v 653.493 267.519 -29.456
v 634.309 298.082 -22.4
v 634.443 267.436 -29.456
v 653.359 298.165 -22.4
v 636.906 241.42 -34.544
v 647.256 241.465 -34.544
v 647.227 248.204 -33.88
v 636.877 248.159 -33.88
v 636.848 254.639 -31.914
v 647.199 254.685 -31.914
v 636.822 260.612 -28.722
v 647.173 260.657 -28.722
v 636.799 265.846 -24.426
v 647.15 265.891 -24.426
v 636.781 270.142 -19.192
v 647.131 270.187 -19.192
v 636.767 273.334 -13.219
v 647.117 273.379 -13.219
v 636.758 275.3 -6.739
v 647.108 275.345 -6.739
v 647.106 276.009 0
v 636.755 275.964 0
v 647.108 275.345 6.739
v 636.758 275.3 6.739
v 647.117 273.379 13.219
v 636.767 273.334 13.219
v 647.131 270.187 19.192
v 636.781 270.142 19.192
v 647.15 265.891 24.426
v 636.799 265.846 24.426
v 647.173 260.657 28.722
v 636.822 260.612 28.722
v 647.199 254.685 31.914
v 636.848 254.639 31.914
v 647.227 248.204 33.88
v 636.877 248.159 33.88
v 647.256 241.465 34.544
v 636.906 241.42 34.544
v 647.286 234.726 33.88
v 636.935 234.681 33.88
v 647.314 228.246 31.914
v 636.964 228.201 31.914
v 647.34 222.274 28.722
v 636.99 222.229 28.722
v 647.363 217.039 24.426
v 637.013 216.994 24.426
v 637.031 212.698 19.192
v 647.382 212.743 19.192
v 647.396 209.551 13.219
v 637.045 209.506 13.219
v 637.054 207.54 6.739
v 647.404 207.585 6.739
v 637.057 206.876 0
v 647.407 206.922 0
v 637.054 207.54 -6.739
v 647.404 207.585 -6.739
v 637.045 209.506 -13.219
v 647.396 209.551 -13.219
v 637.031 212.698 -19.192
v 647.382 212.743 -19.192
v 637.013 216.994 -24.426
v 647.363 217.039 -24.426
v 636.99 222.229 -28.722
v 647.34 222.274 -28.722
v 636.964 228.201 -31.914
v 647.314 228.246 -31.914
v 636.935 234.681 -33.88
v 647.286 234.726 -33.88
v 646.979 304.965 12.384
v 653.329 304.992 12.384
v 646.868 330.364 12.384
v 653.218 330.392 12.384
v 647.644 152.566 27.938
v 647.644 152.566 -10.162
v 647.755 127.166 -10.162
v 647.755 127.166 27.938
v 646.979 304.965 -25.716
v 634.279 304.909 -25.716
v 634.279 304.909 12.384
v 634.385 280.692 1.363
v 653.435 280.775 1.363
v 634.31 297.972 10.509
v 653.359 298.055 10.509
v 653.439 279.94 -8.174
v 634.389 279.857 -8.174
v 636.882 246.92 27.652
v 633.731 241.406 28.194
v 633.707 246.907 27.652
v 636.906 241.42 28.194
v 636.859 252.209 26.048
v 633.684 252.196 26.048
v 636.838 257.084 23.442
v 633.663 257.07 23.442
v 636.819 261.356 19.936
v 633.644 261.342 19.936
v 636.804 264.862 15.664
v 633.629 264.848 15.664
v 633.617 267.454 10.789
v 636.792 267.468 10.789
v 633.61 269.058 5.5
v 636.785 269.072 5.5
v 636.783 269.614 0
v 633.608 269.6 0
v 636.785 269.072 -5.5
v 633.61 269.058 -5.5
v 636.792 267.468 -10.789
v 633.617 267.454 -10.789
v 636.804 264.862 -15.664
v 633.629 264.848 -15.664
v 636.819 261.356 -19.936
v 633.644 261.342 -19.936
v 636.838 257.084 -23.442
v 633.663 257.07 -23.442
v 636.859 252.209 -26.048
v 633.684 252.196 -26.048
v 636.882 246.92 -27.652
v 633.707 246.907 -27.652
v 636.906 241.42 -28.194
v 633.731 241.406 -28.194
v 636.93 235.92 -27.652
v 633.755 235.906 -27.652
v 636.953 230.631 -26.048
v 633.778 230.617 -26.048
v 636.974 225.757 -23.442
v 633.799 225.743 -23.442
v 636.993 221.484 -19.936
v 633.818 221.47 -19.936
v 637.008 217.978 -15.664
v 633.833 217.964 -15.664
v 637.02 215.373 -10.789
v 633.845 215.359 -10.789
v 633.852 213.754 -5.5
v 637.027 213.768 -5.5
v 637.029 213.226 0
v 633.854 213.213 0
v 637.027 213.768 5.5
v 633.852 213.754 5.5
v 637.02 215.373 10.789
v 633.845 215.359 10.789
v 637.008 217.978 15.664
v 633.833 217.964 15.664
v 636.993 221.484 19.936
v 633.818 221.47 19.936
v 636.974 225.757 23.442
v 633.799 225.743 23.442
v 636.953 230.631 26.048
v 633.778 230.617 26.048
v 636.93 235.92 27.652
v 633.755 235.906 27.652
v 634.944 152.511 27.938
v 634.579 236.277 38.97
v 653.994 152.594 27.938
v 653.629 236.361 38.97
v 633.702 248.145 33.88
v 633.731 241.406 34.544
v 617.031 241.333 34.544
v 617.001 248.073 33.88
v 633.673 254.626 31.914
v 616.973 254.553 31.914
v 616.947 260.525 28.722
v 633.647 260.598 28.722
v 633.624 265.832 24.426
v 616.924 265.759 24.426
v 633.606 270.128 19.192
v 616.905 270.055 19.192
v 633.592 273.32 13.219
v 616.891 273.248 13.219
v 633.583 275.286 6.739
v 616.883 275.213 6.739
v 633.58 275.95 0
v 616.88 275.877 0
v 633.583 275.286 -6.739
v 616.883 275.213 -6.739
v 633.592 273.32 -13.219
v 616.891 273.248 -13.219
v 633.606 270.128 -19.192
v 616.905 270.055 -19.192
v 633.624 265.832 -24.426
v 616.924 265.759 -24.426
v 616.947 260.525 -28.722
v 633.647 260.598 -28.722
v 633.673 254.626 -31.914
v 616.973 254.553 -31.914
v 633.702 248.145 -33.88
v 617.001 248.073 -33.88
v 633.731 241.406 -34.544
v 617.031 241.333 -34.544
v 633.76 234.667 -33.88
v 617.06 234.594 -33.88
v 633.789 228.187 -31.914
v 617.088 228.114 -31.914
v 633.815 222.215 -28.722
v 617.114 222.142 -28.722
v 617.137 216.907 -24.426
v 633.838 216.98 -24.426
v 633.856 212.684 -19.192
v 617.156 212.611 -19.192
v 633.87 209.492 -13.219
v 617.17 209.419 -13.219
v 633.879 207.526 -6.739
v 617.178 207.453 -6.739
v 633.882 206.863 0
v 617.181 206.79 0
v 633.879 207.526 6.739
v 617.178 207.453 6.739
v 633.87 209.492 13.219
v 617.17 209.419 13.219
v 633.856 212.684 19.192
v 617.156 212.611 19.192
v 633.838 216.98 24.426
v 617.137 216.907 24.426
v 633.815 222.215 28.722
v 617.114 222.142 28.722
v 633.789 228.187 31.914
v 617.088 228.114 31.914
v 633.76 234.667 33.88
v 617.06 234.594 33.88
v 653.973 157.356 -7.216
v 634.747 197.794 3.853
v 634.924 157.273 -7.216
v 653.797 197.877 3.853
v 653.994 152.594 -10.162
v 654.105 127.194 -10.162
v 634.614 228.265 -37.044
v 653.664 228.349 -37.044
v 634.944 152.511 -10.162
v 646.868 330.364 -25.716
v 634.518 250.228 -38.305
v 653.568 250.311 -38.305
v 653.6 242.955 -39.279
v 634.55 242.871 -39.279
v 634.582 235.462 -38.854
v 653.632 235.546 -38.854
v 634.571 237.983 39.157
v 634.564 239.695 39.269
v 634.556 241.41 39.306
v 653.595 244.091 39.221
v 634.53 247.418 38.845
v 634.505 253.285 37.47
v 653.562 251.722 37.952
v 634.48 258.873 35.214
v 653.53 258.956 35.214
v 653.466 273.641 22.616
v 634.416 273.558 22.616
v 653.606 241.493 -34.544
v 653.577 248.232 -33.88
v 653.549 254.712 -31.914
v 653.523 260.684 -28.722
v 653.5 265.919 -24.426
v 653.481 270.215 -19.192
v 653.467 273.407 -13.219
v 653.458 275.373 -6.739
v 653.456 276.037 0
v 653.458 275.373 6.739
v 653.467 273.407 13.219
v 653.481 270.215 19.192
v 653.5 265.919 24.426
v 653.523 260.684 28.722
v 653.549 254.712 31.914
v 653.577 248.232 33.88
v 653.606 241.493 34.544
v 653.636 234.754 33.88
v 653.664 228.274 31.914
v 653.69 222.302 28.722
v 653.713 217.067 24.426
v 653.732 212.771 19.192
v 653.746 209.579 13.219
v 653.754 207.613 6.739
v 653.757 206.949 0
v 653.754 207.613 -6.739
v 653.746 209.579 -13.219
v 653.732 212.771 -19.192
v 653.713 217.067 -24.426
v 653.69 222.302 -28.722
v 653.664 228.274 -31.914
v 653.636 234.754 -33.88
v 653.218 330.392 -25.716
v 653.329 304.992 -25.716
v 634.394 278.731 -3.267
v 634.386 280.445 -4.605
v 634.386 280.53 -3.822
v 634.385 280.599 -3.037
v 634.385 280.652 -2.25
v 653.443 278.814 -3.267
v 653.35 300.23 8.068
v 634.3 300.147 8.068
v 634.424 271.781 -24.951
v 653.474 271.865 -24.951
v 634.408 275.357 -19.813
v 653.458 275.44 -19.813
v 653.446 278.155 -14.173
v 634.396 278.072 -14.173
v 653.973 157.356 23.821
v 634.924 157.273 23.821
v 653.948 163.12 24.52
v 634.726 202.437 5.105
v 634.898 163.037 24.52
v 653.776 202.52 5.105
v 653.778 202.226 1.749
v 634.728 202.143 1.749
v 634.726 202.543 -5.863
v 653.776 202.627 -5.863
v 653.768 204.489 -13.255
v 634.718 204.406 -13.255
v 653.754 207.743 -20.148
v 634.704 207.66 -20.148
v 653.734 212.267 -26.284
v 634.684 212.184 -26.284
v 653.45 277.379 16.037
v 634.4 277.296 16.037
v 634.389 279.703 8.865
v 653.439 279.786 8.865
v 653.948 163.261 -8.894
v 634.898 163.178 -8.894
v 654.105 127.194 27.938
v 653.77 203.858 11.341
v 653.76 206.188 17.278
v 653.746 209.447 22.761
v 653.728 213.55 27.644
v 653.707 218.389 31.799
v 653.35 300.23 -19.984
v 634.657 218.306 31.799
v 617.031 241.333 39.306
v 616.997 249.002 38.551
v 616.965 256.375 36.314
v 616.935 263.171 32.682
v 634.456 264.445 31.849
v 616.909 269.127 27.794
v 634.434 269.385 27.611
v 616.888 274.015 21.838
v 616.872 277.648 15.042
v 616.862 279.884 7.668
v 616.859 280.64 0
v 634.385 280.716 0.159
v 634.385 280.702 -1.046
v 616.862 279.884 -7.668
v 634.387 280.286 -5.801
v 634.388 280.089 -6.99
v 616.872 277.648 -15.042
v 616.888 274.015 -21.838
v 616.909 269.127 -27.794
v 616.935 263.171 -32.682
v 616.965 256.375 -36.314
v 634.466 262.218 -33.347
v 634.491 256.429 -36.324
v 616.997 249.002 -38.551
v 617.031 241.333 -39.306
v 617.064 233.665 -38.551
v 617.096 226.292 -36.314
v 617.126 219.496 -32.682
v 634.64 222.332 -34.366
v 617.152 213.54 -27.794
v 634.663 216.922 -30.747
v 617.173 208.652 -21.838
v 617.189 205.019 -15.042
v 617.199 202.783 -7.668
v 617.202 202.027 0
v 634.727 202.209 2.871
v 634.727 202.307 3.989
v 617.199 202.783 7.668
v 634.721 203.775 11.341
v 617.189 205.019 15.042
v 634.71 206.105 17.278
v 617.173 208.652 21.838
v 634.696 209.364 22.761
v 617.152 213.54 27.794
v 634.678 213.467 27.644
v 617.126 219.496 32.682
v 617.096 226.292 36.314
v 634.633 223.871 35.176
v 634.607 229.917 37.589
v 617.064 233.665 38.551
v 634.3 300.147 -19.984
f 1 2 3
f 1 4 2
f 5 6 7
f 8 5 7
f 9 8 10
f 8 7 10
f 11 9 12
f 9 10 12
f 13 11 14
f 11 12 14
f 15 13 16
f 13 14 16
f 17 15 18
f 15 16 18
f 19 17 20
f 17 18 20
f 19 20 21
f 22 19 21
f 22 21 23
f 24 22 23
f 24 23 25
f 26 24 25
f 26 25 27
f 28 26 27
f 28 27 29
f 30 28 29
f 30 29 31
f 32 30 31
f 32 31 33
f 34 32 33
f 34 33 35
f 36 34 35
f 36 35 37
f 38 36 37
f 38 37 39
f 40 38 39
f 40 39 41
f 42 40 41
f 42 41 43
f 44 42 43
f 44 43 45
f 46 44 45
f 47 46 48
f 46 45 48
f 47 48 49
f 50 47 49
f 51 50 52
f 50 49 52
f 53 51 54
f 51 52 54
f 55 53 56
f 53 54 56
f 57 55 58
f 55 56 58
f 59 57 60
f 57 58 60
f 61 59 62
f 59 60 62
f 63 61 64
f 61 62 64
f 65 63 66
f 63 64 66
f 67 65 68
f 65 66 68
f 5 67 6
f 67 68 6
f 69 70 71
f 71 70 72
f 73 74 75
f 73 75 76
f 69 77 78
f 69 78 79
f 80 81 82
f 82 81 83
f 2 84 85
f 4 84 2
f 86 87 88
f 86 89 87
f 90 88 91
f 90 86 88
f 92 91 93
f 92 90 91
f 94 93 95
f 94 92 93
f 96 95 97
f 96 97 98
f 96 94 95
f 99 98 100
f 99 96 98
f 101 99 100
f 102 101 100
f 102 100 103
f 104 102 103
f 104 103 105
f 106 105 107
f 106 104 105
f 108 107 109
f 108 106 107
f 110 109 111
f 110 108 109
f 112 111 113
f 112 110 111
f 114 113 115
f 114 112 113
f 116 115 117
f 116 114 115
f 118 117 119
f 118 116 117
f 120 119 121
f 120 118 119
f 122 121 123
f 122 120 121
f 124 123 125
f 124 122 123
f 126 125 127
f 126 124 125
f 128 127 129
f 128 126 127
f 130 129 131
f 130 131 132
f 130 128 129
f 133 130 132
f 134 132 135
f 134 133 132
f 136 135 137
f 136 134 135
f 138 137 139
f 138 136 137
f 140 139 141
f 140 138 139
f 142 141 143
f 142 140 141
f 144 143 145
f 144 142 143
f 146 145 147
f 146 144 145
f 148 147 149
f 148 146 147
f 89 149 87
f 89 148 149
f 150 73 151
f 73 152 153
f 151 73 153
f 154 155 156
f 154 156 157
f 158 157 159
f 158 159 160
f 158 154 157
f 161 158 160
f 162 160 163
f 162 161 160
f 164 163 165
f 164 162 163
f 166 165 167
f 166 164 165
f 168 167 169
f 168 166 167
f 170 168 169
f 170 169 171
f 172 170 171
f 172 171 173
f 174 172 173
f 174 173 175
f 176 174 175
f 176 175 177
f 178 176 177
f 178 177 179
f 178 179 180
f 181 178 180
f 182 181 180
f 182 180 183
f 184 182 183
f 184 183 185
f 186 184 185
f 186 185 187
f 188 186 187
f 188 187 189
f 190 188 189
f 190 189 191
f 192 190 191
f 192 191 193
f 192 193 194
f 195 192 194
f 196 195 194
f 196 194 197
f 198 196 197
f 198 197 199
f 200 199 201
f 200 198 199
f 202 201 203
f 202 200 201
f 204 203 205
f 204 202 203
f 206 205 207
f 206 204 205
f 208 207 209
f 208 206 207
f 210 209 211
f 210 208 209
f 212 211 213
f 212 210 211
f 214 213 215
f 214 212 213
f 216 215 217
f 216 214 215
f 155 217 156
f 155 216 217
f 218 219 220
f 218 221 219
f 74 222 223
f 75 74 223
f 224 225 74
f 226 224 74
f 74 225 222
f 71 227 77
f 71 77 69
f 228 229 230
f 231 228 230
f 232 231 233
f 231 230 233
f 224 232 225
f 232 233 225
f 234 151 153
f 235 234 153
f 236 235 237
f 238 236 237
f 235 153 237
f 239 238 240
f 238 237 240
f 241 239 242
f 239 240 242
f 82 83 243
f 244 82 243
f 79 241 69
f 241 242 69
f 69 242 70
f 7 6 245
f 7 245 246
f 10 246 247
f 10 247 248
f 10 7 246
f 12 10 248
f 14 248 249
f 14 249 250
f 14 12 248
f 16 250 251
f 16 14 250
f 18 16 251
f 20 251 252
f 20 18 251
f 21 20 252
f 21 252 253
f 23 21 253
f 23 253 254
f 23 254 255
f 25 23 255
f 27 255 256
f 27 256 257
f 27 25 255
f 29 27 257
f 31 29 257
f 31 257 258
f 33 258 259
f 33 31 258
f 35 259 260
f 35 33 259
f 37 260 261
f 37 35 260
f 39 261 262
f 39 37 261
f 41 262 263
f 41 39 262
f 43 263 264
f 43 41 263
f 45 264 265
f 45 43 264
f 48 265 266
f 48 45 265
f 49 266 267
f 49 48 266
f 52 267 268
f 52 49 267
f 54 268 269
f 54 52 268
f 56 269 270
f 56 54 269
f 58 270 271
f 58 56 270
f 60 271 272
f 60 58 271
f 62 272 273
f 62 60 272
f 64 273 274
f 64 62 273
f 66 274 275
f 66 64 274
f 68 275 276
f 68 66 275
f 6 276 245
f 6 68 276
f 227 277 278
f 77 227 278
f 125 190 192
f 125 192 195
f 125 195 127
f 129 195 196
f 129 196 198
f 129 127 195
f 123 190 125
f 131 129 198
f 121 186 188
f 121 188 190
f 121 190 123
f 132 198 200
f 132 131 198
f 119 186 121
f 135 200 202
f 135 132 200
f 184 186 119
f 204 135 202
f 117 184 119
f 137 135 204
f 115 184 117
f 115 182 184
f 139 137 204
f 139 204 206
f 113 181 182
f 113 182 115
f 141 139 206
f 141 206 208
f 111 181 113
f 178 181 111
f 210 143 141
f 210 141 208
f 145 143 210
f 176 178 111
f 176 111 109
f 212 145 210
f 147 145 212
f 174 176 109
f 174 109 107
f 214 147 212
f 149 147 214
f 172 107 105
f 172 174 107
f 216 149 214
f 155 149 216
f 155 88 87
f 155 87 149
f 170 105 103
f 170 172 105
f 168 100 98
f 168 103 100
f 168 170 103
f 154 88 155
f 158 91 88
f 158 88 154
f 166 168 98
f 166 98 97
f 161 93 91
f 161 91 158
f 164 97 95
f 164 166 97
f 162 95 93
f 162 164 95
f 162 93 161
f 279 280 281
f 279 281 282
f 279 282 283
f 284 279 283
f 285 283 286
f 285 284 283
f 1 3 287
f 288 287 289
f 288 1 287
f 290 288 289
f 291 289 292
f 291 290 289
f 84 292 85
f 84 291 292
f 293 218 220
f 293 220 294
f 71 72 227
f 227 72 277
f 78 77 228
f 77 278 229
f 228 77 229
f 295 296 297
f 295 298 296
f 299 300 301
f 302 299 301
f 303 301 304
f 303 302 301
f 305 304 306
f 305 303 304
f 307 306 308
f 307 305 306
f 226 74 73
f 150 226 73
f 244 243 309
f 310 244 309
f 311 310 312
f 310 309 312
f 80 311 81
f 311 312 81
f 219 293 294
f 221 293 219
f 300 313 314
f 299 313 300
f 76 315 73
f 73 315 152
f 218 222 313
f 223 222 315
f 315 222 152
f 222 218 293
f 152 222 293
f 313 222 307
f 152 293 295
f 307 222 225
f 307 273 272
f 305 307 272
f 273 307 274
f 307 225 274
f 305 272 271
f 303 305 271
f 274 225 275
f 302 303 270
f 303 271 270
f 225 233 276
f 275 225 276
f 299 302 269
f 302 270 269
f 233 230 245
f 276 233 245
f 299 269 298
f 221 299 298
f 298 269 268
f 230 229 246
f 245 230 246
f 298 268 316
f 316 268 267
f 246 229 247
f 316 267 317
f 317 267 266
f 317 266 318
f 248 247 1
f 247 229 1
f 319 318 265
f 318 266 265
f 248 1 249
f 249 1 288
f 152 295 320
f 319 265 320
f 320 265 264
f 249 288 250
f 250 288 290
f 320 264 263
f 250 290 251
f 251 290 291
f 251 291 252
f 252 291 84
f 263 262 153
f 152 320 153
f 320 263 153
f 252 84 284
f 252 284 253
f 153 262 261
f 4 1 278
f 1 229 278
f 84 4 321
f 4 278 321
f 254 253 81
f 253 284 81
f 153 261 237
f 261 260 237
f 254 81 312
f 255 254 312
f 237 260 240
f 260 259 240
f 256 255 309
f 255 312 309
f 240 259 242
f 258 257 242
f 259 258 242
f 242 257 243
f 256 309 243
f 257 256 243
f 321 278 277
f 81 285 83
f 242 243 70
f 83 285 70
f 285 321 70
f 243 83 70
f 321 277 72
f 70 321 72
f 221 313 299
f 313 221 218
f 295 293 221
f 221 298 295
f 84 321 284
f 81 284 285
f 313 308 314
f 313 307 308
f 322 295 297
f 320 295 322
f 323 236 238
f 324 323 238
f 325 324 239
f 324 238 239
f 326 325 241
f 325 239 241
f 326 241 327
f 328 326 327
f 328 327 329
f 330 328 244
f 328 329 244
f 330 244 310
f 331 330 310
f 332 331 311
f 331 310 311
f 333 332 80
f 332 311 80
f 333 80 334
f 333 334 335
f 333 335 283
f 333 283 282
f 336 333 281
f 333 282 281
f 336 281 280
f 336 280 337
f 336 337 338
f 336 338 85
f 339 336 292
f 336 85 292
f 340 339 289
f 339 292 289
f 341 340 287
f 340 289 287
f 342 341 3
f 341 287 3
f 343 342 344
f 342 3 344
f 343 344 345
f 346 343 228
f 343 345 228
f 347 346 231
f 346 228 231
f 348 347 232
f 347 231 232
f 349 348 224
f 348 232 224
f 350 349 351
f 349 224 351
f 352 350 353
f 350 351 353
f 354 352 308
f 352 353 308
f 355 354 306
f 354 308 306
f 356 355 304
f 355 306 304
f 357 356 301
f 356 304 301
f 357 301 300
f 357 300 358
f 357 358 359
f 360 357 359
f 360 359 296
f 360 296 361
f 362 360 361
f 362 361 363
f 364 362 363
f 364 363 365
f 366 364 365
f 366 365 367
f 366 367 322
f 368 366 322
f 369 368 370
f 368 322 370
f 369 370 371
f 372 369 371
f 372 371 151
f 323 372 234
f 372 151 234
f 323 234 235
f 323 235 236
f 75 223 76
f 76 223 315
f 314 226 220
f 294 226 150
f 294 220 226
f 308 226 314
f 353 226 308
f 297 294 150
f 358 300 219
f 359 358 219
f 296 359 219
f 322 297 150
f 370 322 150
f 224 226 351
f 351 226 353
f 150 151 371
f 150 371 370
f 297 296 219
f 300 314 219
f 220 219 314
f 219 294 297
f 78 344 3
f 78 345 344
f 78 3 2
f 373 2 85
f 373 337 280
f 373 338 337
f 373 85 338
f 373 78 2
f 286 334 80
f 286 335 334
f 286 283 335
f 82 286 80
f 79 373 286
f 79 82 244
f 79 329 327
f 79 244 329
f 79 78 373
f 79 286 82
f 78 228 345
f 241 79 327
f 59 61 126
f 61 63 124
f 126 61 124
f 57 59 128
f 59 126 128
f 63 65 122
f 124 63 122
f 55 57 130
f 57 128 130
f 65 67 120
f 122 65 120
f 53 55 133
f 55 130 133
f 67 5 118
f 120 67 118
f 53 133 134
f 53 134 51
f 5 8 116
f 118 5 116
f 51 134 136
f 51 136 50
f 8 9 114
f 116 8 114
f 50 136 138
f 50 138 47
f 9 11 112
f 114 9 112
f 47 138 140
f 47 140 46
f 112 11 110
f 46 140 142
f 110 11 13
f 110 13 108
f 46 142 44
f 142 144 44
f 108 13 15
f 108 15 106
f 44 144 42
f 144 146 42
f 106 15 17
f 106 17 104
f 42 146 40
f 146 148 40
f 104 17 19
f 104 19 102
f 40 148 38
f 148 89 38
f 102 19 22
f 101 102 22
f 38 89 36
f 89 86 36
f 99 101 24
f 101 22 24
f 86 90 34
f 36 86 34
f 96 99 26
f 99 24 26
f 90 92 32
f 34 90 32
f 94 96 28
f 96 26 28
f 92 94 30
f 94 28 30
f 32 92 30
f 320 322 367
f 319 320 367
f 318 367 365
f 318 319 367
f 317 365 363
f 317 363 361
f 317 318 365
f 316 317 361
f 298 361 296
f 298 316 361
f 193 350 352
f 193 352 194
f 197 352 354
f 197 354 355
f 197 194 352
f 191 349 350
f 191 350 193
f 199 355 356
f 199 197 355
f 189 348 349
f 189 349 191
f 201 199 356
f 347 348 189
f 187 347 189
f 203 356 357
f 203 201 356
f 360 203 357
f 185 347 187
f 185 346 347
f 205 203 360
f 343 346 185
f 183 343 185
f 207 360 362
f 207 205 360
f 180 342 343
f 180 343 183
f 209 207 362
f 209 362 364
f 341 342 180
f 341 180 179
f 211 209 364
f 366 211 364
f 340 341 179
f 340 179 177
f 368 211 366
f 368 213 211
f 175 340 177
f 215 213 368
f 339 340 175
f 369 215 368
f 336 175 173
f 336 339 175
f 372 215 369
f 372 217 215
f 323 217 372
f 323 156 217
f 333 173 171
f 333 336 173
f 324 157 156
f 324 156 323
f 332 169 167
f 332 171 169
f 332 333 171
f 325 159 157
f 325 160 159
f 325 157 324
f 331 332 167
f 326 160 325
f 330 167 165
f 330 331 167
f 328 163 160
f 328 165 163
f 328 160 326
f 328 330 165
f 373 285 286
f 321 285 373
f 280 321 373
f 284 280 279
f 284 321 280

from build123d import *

# Parameters (mm, degrees)
SKETCH1_R                = 34.544
BOSS_EXTRUDE1_DEPTH      = 6.35
BOSS_EXTRUDE1_DEPTH_BACK = 12.7
CUT_EXTRUDE1_START       = -12.7
SKETCH2_W                = 38.1
SKETCH2_H                = 25.4
CUT_EXTRUDE1_DEPTH       = 12.7
SKETCH3_R                = 39.3065
SKETCH3_R_2              = 34.544
BOSS_EXTRUDE2_DEPTH      = 17.526
SKETCH4_R                = 34.544
SKETCH4_R_2              = 28.194
BOSS_EXTRUDE3_DEPTH      = 1.5875


with BuildPart() as part:
    # Sketch1 → Boss-Extrude1 (new body, two sides)
    with BuildSketch(Plane(origin=(648.29757997, 2.828749778, 0), x_dir=(0, 0, -1), z_dir=(0.999990481, 0.004363309, 0))) as boss_extrude1_sk:
        with BuildLine():
            Line((10.162421384, 149.738796817), (10.162421384, 124.338796817))
            Line((10.162421384, 124.338796817), (-27.937578616, 124.338796817))
            Line((-27.937578616, 124.338796817), (-27.937578616, 149.738796817))
            Line((-27.937578616, 149.738796817), (-38.969975232, 233.506353672))
            ThreePointArc((-38.969975232, 233.506353672), (-38.774533686, 245.083676928), (-35.214302621, 256.101724211))
            Line((-35.214302621, 256.101724211), (-12.384316038, 302.138796817))
            Line((-12.384316038, 302.138796817), (-12.384316038, 327.538796817))
            Line((-12.384316038, 327.538796817), (25.715683962, 327.538796817))
            Line((25.715683962, 327.538796817), (25.715683962, 302.138796817))
            Line((25.715683962, 302.138796817), (38.304504923, 247.457291294))
            ThreePointArc((38.304504923, 247.457291294), (39.241875136, 236.385759301), (37.043517063, 225.49426237))
            Line((37.043517063, 225.49426237), (10.162421384, 149.738796817))
        make_face()
        with Locations((0, 238.638796817)):
            Circle(SKETCH1_R, mode=Mode.SUBTRACT)
        with BuildLine():
            Line((22.400354986, 295.311648337), (29.455908243, 264.664753318))
            ThreePointArc((29.455908243, 264.664753318), (19.813317438, 272.586306215), (8.173615245, 277.086071832))
            Line((8.173615245, 277.086071832), (22.400354986, 295.311648337))
        make_face(mode=Mode.SUBTRACT)
        with BuildLine():
            Line((-1.363444644, 277.921642449), (-10.508730274, 295.201256573))
            Line((-10.508730274, 295.201256573), (-22.615671737, 270.787394518))
            ThreePointArc((-22.615671737, 270.787394518), (-12.508951954, 275.901741725), (-1.363444644, 277.921642449))
        make_face(mode=Mode.SUBTRACT)
        Polygon((19.984225718, 297.376296817), (3.266942404, 275.960137419), (-8.067621746, 297.376296817), align=None, mode=Mode.SUBTRACT)
        with BuildLine():
            Line((26.283654933, 209.412602647), (8.894198101, 160.406177697))
            Line((8.894198101, 160.406177697), (-1.749435192, 199.371247635))
            ThreePointArc((-1.749435192, 199.371247635), (13.254779787, 201.63458415), (26.283654933, 209.412602647))
        make_face(mode=Mode.SUBTRACT)
        with BuildLine():
            Line((-5.104730105, 199.665181732), (-24.520278978, 160.264997004))
            Line((-24.520278978, 160.264997004), (-31.799445858, 215.534767182))
            ThreePointArc((-31.799445858, 215.534767182), (-20.085828001, 204.851810331), (-5.104730105, 199.665181732))
        make_face(mode=Mode.SUBTRACT)
        Polygon((-3.852902363, 195.022655751), (7.215844228, 154.501296817), (-23.820941352, 154.501296817), align=None, mode=Mode.SUBTRACT)
    extrude(amount=BOSS_EXTRUDE1_DEPTH)
    extrude(boss_extrude1_sk.sketch, amount=-BOSS_EXTRUDE1_DEPTH_BACK)

    # Sketch2 → Cut-Extrude1 (cut)
    with BuildSketch(Plane(origin=(635.597700865, 2.77333575, 0), x_dir=(0, 0, 1), z_dir=(-0.999990481, -0.004363309, 0)).offset(CUT_EXTRUDE1_START)):
        with Locations((-6.665683962, 314.838796817)):
            Rectangle(SKETCH2_W, SKETCH2_H)
        with Locations((8.887578616, 137.038796817)):
            Rectangle(SKETCH2_W, SKETCH2_H)
    extrude(amount=CUT_EXTRUDE1_DEPTH, mode=Mode.SUBTRACT)

    # Sketch3 → Boss-Extrude2 (add)
    with BuildSketch(Plane(origin=(635.597700865, 2.77333575, 0), x_dir=(0, 0, 1), z_dir=(-0.999990481, -0.004363309, 0))):
        with Locations((0, 238.638796817)):
            Circle(SKETCH3_R)
        with Locations((0, 238.638796817)):
            Circle(SKETCH3_R_2, mode=Mode.SUBTRACT)
    extrude(amount=BOSS_EXTRUDE2_DEPTH)

    # Sketch4 → Boss-Extrude3 (add, symmetric)
    with BuildSketch(Plane(origin=(636.359693611, 2.776660591, 0), x_dir=(0, 0, 1), z_dir=(-0.999990481, -0.004363309, 0))):
        with Locations((0, 238.638796817)):
            Circle(SKETCH4_R)
        with Locations((0, 238.638796817)):
            Circle(SKETCH4_R_2, mode=Mode.SUBTRACT)
    extrude(amount=BOSS_EXTRUDE3_DEPTH, both=True)


solid = part.part
